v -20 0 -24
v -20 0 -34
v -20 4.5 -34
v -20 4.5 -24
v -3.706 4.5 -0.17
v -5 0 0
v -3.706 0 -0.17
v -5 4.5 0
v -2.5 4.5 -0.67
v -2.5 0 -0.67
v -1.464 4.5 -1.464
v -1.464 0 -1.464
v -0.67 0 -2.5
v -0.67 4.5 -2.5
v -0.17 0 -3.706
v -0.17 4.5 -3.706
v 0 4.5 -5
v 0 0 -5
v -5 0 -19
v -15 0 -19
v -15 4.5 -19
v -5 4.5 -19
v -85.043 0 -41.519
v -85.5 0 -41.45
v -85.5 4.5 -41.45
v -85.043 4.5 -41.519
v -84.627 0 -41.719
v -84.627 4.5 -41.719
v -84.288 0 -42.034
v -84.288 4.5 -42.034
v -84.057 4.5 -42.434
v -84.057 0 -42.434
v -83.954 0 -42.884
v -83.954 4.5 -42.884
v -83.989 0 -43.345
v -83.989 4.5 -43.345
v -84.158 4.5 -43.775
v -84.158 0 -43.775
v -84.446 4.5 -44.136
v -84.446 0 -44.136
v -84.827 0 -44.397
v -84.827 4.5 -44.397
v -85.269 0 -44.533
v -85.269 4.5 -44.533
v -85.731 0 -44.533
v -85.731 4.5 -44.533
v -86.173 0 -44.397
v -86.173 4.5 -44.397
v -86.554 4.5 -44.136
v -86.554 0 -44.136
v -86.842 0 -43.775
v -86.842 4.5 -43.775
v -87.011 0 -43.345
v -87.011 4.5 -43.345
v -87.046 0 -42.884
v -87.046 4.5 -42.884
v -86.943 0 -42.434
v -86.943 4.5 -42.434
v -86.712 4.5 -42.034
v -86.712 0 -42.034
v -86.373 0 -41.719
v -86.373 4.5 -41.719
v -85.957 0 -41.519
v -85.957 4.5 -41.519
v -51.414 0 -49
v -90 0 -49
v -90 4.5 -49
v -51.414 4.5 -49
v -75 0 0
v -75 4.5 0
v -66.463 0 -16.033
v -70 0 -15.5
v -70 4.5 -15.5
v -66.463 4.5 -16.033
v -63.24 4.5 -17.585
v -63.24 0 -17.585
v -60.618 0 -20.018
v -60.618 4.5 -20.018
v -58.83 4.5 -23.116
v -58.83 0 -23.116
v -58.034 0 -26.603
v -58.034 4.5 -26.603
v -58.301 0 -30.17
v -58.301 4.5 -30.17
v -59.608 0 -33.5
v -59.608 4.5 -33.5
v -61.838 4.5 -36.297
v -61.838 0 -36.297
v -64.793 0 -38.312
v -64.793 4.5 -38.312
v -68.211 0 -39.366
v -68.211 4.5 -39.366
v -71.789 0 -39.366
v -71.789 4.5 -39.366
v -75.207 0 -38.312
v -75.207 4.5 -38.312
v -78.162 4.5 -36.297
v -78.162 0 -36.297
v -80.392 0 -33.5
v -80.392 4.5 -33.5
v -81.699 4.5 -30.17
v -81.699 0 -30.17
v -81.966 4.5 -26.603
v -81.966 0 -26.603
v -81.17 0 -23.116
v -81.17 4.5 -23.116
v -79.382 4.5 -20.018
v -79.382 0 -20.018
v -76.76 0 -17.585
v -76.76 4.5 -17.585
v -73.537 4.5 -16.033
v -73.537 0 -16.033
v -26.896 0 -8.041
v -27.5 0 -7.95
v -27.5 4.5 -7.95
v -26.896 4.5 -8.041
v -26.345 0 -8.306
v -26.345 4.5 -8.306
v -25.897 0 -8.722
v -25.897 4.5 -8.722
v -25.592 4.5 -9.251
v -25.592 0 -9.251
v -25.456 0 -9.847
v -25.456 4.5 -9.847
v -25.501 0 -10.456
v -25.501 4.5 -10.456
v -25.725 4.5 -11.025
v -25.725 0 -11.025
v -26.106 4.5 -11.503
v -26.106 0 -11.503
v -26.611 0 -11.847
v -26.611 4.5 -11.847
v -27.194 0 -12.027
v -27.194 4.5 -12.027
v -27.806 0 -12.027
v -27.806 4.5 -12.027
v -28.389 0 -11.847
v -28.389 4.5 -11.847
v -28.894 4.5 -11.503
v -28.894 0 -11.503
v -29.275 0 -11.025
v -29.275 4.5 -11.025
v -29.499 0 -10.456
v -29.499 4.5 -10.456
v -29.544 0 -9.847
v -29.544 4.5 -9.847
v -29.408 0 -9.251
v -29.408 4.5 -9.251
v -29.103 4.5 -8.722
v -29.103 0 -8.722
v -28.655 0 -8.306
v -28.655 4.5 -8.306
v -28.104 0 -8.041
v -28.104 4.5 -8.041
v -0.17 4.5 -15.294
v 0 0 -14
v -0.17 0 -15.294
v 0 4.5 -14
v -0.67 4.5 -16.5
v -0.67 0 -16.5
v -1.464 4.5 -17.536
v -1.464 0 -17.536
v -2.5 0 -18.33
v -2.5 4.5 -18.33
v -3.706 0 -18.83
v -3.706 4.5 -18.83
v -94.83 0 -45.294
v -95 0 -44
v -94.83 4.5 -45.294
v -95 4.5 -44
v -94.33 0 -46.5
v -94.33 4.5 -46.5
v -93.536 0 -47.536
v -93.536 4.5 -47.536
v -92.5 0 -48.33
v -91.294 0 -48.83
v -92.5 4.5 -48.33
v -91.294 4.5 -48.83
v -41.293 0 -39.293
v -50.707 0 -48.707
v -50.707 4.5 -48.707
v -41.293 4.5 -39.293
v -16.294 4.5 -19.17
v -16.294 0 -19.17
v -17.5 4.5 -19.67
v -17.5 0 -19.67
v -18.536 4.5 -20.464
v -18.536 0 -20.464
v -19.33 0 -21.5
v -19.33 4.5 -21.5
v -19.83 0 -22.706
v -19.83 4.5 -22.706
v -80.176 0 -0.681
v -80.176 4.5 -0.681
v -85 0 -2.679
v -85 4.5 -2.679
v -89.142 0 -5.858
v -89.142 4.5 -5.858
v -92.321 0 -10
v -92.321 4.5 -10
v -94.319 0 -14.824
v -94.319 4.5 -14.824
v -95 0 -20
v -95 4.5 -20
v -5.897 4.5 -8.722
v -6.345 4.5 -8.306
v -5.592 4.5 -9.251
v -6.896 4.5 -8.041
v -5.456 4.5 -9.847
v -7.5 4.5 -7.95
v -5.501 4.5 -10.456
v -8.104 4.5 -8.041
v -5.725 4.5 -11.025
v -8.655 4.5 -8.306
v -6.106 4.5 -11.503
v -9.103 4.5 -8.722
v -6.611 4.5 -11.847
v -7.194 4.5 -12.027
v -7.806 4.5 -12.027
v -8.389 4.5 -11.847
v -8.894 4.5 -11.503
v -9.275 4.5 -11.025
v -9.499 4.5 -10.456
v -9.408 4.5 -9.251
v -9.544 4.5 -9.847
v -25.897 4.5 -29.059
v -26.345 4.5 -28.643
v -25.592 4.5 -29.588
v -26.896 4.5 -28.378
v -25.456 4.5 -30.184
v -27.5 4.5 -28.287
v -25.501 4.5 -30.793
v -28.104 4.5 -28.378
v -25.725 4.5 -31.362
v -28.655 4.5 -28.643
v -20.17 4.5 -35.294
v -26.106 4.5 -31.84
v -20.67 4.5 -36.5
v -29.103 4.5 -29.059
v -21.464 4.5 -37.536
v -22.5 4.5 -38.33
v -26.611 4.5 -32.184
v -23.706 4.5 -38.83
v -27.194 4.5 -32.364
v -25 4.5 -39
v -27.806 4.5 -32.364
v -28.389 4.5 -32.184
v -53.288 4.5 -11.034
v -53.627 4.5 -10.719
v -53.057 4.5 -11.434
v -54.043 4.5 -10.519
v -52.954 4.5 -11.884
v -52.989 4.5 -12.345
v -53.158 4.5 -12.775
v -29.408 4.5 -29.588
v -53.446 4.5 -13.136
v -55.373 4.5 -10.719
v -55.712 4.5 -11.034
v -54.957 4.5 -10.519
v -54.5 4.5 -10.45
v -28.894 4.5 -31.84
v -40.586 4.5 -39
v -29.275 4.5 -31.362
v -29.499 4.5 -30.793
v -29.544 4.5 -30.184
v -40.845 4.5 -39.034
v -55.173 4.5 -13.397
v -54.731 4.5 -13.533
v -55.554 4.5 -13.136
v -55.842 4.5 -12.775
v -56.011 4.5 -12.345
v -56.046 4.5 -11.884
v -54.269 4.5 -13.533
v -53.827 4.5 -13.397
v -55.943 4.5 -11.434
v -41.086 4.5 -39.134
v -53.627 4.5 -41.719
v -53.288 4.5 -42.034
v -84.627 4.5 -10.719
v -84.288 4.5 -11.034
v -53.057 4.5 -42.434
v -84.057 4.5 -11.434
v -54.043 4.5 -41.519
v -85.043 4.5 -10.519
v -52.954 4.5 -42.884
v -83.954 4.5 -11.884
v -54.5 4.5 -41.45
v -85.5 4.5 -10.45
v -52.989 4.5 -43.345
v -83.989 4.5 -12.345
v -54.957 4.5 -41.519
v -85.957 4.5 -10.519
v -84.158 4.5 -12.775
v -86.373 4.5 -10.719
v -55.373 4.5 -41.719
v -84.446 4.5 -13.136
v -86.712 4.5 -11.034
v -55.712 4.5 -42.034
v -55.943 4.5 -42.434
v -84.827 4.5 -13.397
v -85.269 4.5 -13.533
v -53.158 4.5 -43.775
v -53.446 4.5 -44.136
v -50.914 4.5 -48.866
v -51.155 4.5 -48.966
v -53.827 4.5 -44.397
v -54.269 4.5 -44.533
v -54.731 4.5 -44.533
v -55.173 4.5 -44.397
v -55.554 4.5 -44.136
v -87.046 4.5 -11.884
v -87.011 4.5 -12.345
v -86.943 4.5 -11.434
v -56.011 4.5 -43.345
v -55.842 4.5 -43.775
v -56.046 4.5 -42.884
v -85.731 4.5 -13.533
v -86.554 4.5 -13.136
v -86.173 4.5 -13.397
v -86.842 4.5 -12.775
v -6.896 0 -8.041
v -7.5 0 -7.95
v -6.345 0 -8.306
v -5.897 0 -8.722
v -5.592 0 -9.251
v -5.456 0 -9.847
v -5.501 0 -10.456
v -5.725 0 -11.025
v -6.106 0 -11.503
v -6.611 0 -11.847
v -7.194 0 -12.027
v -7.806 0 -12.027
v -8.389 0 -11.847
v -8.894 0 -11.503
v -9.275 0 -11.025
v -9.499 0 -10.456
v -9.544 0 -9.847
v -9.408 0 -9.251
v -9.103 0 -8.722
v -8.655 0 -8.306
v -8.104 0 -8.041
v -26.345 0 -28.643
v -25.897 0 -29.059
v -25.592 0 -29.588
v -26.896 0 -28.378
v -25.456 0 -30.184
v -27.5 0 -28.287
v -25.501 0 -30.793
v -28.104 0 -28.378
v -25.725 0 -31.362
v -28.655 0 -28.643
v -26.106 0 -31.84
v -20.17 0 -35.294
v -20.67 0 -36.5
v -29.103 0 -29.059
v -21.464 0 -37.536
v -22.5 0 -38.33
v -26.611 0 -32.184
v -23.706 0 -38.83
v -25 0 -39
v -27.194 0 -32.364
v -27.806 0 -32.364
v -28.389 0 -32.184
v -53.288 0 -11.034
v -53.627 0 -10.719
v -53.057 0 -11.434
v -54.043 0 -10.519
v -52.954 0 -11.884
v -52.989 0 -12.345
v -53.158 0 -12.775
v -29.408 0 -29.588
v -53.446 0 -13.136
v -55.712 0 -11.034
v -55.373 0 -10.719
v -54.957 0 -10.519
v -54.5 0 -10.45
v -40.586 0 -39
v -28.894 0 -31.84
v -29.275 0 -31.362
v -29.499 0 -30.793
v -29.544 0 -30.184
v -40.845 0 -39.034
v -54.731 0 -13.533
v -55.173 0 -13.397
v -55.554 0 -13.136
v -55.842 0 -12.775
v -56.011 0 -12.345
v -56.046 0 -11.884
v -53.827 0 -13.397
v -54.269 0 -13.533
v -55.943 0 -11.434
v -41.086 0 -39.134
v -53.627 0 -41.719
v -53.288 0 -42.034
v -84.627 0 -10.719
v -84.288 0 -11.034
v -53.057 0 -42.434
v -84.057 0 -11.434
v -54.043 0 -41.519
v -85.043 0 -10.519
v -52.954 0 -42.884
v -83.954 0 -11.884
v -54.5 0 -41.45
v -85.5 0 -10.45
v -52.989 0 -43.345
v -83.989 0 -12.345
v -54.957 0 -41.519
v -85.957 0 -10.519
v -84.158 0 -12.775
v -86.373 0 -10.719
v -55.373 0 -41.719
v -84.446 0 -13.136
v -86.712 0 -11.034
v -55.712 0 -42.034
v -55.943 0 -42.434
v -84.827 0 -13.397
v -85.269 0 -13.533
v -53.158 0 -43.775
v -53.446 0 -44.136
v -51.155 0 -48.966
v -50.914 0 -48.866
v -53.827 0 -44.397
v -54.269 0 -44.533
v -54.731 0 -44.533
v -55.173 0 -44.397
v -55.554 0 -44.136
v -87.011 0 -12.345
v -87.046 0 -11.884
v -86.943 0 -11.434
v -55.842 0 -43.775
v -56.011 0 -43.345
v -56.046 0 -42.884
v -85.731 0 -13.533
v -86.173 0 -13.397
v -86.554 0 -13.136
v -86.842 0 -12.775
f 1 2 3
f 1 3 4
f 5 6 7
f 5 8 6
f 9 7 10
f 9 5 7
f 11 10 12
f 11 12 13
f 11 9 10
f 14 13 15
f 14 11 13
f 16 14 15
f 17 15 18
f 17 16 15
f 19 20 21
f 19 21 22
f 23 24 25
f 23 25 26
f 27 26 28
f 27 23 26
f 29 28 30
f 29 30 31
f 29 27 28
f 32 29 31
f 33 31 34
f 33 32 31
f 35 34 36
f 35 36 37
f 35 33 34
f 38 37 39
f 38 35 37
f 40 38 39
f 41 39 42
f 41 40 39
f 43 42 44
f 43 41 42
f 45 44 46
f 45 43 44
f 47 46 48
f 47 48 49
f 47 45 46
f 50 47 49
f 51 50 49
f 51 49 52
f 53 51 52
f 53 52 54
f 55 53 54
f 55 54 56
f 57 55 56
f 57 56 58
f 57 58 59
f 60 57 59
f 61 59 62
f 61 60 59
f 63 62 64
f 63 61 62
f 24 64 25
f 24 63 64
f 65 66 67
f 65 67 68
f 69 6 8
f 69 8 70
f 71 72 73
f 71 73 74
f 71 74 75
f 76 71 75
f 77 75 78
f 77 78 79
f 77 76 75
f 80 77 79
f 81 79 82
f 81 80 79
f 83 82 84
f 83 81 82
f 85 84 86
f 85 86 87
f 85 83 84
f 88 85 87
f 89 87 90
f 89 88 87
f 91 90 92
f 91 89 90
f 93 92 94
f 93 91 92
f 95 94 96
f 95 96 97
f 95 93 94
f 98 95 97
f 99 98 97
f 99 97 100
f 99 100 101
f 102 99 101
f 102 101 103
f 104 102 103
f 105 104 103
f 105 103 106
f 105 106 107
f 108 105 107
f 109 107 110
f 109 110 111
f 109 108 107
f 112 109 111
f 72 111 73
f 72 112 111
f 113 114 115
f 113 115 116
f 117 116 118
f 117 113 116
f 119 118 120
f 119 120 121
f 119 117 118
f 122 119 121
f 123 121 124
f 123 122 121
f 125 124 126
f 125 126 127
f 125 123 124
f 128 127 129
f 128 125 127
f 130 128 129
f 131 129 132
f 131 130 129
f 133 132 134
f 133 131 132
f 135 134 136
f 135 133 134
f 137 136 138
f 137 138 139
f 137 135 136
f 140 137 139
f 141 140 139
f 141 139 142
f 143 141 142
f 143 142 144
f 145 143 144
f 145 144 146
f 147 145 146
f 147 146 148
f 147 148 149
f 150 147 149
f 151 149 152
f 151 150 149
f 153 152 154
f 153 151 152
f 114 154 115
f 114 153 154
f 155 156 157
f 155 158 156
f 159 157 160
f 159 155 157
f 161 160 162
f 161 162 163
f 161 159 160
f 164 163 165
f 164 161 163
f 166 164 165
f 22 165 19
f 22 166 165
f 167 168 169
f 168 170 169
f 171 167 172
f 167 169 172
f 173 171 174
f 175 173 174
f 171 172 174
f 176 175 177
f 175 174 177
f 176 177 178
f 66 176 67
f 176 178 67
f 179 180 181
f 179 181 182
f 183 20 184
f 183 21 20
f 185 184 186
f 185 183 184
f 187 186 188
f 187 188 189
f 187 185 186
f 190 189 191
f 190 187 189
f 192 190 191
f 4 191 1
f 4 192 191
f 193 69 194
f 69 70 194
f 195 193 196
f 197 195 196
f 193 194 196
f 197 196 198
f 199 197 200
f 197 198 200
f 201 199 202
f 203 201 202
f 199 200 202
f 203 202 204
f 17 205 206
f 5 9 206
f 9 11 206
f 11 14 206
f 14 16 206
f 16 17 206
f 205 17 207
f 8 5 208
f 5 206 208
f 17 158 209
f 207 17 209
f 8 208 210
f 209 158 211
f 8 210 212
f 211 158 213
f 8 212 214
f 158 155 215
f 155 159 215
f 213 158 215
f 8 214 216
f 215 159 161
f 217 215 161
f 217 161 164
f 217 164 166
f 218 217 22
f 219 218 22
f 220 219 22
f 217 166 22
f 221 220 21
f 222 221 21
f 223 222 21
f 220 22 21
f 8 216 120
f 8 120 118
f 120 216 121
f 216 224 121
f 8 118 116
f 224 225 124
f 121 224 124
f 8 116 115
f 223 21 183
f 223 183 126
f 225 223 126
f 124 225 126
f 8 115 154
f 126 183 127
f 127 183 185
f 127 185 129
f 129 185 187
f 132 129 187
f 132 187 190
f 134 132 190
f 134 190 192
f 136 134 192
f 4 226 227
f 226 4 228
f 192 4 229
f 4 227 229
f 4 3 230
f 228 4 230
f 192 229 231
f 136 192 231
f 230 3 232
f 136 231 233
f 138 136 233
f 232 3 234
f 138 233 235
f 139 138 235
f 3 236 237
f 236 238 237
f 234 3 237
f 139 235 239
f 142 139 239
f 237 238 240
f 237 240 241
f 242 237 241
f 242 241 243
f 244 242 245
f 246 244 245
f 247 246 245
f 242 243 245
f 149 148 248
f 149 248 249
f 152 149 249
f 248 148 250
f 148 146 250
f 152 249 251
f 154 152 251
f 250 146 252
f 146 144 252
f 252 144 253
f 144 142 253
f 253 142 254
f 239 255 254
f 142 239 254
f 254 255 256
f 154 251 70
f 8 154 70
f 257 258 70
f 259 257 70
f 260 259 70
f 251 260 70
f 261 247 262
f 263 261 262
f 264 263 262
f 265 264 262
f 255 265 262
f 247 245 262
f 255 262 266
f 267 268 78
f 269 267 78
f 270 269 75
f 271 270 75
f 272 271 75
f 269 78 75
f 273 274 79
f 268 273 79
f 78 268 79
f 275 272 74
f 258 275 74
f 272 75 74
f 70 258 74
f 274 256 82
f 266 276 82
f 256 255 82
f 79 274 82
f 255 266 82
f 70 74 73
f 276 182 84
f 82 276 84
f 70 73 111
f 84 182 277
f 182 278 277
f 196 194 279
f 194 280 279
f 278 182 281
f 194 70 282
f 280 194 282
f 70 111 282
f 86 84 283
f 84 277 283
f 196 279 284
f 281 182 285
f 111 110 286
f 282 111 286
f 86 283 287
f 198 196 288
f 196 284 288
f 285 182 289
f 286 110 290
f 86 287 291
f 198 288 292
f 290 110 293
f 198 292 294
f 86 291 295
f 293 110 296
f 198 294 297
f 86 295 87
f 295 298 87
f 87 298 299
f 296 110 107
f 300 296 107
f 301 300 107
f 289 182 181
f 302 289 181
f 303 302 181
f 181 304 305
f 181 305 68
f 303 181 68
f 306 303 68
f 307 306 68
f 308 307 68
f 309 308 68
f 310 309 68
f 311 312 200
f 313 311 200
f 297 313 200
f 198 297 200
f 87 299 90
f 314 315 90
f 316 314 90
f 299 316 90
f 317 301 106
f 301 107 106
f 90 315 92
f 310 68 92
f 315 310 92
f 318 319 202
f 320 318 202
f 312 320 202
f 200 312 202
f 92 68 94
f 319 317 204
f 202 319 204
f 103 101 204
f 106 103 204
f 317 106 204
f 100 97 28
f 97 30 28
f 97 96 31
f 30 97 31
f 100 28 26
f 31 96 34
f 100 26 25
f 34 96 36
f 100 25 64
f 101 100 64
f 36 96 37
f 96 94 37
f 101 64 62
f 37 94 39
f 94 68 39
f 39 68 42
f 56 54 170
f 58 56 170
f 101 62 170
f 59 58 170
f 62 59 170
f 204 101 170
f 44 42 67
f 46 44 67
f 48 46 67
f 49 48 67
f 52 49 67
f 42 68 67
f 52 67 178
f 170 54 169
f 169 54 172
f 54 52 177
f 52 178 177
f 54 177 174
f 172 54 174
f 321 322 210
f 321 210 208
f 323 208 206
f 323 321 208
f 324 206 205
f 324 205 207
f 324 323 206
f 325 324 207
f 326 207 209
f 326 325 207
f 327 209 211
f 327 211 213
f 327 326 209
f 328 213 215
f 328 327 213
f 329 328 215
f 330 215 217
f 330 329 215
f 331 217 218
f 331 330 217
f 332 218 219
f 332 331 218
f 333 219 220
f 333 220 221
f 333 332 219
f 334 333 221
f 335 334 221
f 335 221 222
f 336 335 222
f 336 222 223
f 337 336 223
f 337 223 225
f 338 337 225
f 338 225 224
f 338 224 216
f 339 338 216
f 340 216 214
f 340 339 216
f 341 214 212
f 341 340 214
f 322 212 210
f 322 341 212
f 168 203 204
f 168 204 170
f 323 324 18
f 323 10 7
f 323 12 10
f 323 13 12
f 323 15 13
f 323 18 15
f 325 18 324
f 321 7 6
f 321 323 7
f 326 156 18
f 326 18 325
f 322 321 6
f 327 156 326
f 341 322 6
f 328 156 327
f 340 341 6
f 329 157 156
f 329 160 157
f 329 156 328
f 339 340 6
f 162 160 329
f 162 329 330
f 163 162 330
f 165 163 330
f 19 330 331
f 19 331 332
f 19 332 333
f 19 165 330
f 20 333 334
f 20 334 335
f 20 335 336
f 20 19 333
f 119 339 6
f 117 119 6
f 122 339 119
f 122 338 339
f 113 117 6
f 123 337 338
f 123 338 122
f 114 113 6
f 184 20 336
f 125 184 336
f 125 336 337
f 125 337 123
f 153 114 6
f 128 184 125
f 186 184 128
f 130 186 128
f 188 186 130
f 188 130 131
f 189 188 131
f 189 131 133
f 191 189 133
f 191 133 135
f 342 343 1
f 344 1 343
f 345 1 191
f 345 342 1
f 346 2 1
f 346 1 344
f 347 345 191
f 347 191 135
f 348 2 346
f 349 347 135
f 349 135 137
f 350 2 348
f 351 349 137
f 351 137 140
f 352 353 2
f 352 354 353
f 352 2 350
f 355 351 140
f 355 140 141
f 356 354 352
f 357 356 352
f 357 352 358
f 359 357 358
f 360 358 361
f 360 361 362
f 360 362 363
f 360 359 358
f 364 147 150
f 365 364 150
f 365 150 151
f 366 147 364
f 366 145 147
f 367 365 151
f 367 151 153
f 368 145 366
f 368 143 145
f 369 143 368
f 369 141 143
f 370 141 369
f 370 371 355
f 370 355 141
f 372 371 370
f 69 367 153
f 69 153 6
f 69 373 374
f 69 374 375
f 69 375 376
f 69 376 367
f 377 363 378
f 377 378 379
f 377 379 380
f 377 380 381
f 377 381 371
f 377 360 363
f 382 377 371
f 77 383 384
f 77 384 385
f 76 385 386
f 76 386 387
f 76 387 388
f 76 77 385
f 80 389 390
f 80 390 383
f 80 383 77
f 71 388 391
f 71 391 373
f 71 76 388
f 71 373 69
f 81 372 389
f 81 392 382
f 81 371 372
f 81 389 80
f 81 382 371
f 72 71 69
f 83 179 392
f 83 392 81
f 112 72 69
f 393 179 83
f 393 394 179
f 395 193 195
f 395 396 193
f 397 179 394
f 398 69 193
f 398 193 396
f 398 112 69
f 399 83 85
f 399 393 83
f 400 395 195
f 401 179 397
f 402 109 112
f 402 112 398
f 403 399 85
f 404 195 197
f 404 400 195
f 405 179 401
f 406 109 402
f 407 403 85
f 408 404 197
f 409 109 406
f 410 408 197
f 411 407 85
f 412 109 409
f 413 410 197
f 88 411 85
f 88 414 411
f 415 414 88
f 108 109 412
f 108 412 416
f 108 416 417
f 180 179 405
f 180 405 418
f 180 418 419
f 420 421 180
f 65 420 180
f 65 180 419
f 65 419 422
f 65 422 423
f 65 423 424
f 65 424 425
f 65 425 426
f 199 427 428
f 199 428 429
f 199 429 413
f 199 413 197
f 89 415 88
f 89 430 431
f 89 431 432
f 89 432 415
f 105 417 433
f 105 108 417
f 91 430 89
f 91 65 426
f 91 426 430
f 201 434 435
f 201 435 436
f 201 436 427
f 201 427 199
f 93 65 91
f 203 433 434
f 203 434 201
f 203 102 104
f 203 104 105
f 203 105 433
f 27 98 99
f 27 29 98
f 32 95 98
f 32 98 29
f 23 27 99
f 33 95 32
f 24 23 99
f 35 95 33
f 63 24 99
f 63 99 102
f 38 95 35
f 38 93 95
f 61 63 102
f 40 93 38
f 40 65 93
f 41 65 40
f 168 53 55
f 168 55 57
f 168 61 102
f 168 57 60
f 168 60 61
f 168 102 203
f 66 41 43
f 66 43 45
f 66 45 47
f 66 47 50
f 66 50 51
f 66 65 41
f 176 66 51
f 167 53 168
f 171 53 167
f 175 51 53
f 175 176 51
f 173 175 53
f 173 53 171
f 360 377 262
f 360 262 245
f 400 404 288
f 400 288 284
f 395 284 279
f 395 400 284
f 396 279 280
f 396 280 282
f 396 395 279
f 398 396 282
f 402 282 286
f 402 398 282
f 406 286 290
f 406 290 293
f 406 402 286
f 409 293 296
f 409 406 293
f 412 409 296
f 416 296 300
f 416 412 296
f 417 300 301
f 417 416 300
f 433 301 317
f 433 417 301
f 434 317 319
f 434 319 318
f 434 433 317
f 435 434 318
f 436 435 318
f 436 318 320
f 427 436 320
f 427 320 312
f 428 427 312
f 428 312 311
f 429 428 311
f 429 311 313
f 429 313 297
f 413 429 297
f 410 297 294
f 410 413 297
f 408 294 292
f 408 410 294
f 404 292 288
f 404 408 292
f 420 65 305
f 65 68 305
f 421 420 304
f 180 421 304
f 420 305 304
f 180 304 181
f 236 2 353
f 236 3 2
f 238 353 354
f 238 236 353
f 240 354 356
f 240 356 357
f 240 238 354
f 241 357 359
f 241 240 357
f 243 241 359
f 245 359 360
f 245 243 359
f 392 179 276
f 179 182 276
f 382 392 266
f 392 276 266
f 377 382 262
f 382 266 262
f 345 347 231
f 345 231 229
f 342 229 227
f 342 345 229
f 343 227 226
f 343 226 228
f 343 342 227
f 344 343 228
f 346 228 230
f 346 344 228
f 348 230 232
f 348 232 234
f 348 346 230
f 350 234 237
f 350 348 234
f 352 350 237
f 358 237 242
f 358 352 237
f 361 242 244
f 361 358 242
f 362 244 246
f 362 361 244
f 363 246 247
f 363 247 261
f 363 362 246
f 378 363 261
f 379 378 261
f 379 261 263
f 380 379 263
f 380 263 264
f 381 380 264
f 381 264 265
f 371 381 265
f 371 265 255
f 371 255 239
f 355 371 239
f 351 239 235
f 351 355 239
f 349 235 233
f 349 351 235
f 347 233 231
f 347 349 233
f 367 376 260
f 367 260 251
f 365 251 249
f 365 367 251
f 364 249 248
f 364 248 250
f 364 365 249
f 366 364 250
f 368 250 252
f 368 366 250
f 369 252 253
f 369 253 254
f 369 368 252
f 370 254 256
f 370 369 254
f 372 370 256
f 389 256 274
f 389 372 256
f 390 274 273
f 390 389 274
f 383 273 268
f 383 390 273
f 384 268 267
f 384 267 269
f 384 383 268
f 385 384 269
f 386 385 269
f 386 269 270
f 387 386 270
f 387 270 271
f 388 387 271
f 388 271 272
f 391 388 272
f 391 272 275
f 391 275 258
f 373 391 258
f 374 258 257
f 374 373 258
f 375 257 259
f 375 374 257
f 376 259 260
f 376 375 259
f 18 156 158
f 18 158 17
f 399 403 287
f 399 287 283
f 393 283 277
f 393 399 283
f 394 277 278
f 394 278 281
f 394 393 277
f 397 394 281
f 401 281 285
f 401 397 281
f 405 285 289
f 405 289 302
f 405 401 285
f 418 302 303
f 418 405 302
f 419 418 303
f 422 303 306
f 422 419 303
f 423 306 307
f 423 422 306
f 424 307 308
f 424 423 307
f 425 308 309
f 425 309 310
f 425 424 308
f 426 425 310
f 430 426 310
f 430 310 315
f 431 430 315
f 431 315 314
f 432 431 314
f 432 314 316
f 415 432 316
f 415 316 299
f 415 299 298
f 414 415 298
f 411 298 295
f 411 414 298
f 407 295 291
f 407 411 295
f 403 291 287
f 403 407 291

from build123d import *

# Parameters (mm, degrees)
SKETCH1_R           = 2.05
SKETCH1_R_2         = 12
SKETCH1_R_3         = 1.55
BOSS_EXTRUDE1_DEPTH = 4.5
FILLET1_R           = 20
FILLET2_R           = 5
FILLET3_R           = 1


with BuildPart() as part:
    # Sketch1 → Boss-Extrude1 (new body)
    with BuildSketch(Plane(origin=(0, 0, 0), x_dir=(1, 0, 0), z_dir=(0, 1, 0))):
        Polygon((0, 0), (-95, 0), (-95, 49), (-51, 49), (-41, 39), (-20, 39), (-20, 19), (0, 19), align=None)
        with Locations(Location((-7.5, 10, 0), (0, 0, 270))):
            Circle(SKETCH1_R, mode=Mode.SUBTRACT)
        with Locations(Location((-27.5, 10, 0), (0, 0, 270))):
            Circle(SKETCH1_R, mode=Mode.SUBTRACT)
        with Locations(Location((-27.5, 30.337245127, 0), (0, 0, 270))):
            Circle(SKETCH1_R, mode=Mode.SUBTRACT)
        with Locations(Location((-70, 27.5, 0), (0, 0, 270))):
            Circle(SKETCH1_R_2, mode=Mode.SUBTRACT)
        with Locations(Location((-85.5, 43, 0), (0, 0, 270))):
            Circle(SKETCH1_R_3, mode=Mode.SUBTRACT)
        with Locations(Location((-54.5, 43, 0), (0, 0, 270))):
            Circle(SKETCH1_R_3, mode=Mode.SUBTRACT)
        with Locations(Location((-85.5, 12, 0), (0, 0, 270))):
            Circle(SKETCH1_R_3, mode=Mode.SUBTRACT)
        with Locations(Location((-54.5, 12, 0), (0, 0, 270))):
            Circle(SKETCH1_R_3, mode=Mode.SUBTRACT)
    extrude(amount=BOSS_EXTRUDE1_DEPTH)

    # Fillet1
    fillet1_edges = [part.edges().sort_by_distance(p)[0] for p in [
        (-95, 2.25, 0),
    ]]
    fillet(fillet1_edges, radius=FILLET1_R)

    # Fillet2
    fillet2_edges = [part.edges().sort_by_distance(p)[0] for p in [
        (0, 2.25, 0),
        (-95, 2.25, -49),
        (-20, 2.25, -39),
        (-20, 2.25, -19),
        (0, 2.25, -19),
    ]]
    fillet(fillet2_edges, radius=FILLET2_R)

    # Fillet3
    fillet3_edges = [part.edges().sort_by_distance(p)[0] for p in [
        (-51, 2.25, -49),
        (-41, 2.25, -39),
    ]]
    fillet(fillet3_edges, radius=FILLET3_R)


solid = part.part
